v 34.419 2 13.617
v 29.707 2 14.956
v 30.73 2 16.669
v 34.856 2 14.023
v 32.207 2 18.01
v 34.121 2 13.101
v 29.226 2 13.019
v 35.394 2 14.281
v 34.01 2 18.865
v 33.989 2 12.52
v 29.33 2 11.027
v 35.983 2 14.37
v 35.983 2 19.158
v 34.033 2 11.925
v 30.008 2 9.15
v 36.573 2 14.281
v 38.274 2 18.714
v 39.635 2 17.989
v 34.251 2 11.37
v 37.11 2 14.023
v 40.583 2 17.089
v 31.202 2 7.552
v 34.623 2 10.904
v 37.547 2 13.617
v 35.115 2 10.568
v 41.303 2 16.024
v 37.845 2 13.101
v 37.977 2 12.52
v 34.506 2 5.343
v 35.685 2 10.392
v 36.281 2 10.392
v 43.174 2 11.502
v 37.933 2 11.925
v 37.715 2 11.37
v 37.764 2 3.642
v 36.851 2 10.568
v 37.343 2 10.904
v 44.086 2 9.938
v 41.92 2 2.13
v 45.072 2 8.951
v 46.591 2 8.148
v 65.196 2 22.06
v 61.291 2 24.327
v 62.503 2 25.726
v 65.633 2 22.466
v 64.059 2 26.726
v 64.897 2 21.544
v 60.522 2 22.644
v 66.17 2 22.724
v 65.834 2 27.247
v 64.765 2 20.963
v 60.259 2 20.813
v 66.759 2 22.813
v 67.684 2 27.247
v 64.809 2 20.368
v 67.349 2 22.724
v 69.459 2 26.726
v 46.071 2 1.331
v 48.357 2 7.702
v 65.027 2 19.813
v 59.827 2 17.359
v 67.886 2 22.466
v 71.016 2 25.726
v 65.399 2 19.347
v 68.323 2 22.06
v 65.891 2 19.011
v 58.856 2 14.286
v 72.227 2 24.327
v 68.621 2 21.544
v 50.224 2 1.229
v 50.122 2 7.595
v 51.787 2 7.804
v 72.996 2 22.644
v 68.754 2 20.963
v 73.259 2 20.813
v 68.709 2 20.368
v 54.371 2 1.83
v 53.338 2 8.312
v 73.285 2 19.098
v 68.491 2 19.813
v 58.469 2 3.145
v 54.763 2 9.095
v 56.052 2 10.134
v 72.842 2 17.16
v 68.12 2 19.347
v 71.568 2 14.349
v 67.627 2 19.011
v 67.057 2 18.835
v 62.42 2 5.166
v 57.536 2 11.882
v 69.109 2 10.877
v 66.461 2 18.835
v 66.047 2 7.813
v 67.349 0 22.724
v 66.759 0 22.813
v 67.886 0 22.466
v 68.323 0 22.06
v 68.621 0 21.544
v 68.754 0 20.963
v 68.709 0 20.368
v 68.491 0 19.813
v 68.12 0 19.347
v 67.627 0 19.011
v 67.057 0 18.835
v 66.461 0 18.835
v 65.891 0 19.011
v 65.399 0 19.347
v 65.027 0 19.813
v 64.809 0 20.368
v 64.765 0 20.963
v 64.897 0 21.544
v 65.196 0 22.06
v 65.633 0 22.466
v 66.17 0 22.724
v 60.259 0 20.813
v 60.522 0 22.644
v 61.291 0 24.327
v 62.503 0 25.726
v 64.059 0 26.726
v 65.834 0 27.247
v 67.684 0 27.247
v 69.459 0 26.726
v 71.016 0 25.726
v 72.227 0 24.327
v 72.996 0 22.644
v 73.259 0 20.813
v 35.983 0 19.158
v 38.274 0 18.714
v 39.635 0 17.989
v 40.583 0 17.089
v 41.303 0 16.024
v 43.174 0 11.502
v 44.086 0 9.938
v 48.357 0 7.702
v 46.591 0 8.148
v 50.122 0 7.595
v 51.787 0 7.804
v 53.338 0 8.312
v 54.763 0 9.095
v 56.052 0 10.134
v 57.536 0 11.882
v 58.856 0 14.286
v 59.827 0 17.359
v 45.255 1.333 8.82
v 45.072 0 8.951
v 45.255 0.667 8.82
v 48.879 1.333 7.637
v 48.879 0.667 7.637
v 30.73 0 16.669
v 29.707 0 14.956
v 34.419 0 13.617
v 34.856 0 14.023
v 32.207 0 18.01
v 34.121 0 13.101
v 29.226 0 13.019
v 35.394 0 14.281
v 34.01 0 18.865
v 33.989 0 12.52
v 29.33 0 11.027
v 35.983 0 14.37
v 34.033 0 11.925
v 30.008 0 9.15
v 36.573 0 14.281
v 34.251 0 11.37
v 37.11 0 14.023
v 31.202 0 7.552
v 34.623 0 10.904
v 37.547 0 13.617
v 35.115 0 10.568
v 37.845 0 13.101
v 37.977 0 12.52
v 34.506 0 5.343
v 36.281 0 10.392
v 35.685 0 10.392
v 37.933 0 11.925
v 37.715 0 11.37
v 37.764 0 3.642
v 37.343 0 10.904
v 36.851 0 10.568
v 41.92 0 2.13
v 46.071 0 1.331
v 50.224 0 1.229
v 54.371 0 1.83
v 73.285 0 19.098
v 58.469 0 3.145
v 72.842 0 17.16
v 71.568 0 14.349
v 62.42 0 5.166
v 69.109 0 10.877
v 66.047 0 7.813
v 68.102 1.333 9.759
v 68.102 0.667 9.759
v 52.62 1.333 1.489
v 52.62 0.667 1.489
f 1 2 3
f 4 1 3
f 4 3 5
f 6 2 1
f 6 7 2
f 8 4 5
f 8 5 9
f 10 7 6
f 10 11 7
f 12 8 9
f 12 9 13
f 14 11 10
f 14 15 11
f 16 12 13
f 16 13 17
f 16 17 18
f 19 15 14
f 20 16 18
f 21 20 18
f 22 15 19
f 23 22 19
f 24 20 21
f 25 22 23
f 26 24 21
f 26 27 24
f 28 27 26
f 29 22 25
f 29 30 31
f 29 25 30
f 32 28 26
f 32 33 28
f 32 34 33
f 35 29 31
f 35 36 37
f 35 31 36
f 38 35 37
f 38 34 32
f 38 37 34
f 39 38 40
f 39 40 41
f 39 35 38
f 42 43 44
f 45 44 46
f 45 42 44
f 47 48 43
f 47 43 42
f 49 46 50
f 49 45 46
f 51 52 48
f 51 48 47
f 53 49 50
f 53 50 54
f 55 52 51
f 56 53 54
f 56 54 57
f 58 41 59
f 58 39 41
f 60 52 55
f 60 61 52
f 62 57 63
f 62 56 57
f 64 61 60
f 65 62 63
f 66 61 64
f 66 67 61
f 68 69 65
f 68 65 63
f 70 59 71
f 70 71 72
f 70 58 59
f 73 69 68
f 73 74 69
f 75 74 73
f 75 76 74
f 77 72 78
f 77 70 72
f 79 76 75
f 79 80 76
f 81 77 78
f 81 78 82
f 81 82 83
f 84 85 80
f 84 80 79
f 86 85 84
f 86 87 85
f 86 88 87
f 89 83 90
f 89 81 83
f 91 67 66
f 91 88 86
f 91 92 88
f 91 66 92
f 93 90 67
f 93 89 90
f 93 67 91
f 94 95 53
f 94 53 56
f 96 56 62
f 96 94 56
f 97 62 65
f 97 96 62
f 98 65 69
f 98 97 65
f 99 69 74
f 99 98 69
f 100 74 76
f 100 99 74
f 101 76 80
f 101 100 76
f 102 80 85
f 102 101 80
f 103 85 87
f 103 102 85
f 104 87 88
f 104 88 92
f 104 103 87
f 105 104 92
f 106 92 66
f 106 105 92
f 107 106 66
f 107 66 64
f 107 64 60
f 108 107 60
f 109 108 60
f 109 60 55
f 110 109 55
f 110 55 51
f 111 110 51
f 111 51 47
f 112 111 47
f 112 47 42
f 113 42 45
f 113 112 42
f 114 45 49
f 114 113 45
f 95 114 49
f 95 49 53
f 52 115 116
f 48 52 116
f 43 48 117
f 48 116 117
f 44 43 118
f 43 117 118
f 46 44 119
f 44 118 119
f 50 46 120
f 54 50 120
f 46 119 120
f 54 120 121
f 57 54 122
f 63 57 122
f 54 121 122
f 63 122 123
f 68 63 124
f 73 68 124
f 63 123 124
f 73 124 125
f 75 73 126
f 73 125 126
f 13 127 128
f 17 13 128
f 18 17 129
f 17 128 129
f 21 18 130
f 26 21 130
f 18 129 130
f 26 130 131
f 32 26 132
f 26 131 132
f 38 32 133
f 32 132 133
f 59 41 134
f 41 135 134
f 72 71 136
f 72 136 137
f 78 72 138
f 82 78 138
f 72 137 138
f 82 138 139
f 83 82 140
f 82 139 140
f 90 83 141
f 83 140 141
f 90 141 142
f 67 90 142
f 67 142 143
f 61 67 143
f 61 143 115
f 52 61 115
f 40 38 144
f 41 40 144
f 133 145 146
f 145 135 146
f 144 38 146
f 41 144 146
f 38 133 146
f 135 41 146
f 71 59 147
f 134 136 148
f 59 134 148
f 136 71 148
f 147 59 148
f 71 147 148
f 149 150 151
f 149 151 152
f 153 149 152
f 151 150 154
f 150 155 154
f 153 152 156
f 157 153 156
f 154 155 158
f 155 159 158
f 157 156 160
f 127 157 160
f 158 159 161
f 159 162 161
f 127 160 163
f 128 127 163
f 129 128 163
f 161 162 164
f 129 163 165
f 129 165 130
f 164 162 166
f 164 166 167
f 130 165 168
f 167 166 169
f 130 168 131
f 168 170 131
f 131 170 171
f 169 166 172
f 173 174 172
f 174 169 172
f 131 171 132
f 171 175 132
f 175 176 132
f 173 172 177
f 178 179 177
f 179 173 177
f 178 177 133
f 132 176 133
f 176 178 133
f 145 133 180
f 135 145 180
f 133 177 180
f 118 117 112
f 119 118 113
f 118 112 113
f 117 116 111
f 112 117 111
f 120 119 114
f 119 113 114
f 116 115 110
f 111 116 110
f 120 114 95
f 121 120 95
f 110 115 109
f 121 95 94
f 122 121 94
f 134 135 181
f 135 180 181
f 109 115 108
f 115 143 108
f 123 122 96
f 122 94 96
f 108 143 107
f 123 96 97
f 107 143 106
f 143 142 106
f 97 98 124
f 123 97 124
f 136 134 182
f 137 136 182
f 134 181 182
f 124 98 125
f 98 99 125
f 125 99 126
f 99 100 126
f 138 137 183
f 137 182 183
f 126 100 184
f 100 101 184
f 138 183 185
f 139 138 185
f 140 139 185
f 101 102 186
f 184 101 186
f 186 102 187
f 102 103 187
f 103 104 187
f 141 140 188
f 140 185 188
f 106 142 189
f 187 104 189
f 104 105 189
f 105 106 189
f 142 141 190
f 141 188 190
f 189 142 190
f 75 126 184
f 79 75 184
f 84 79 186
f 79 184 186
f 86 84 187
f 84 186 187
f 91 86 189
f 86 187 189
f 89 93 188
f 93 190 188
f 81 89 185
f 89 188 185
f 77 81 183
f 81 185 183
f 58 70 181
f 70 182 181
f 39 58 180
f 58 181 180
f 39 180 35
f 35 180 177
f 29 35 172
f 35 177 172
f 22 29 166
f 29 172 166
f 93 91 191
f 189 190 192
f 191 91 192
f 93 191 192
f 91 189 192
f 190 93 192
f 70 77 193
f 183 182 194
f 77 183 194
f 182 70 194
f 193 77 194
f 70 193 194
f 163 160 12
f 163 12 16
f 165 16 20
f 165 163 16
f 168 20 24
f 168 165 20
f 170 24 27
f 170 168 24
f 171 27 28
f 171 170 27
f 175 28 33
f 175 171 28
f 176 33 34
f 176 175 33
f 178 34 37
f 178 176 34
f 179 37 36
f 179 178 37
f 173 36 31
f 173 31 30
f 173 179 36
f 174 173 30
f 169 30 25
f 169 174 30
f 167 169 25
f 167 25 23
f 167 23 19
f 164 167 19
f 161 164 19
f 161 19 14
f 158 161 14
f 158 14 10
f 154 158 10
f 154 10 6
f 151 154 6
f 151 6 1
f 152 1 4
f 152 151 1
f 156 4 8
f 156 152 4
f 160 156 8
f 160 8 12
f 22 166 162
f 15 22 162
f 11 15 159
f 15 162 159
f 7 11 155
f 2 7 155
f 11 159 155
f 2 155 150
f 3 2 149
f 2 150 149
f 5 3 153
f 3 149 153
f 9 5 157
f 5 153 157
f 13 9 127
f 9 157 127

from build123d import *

# Parameters (mm, degrees)
SKETCH1_R           = 2
BOSS_EXTRUDE1_DEPTH = 2


with BuildPart() as part:
    # Sketch1 → Boss-Extrude1 (new body)
    with BuildSketch(Plane(origin=(0, 0, 0), x_dir=(1, 0, 0), z_dir=(0, 1, 0))):
        with BuildLine():
            ThreePointArc((60.25917084, -20.813153262), (66.75917084, -27.313153262), (73.25917084, -20.813153262))
            add(Edge.make_bspline(
                [(73.25917084, -20.813153262), (74.725858168, -12.215971783), (54.126029771, 9.525852706), (31.201928349, -7.551955027)],
                knots=[0, 0, 0, 0, 1, 1, 1, 1], degree=3))
            ThreePointArc((31.201928349, -7.551955027), (29.706944434, -14.955610566), (35.983050773, -19.157941046))
            add(Edge.make_bspline(
                [(35.983050773, -19.157941046), (43.250832756, -18.735453142), (40.848767318, -9.67489742), (54.400187509, -5.83653854), (59.938197313, -12.850383441), (60.25917084, -20.813153262)],
                knots=[0, 0, 0, 0, 0.397902878, 0.497902878, 1, 1, 1, 1], degree=3))
        make_face()
        with Locations(Location((35.983050773, -12.37014883, 0), (0, 0, 270))):
            Circle(SKETCH1_R, mode=Mode.SUBTRACT)
        with Locations(Location((66.75917084, -20.813153262, 0), (0, 0, 270))):
            Circle(SKETCH1_R, mode=Mode.SUBTRACT)
    extrude(amount=BOSS_EXTRUDE1_DEPTH)


solid = part.part
